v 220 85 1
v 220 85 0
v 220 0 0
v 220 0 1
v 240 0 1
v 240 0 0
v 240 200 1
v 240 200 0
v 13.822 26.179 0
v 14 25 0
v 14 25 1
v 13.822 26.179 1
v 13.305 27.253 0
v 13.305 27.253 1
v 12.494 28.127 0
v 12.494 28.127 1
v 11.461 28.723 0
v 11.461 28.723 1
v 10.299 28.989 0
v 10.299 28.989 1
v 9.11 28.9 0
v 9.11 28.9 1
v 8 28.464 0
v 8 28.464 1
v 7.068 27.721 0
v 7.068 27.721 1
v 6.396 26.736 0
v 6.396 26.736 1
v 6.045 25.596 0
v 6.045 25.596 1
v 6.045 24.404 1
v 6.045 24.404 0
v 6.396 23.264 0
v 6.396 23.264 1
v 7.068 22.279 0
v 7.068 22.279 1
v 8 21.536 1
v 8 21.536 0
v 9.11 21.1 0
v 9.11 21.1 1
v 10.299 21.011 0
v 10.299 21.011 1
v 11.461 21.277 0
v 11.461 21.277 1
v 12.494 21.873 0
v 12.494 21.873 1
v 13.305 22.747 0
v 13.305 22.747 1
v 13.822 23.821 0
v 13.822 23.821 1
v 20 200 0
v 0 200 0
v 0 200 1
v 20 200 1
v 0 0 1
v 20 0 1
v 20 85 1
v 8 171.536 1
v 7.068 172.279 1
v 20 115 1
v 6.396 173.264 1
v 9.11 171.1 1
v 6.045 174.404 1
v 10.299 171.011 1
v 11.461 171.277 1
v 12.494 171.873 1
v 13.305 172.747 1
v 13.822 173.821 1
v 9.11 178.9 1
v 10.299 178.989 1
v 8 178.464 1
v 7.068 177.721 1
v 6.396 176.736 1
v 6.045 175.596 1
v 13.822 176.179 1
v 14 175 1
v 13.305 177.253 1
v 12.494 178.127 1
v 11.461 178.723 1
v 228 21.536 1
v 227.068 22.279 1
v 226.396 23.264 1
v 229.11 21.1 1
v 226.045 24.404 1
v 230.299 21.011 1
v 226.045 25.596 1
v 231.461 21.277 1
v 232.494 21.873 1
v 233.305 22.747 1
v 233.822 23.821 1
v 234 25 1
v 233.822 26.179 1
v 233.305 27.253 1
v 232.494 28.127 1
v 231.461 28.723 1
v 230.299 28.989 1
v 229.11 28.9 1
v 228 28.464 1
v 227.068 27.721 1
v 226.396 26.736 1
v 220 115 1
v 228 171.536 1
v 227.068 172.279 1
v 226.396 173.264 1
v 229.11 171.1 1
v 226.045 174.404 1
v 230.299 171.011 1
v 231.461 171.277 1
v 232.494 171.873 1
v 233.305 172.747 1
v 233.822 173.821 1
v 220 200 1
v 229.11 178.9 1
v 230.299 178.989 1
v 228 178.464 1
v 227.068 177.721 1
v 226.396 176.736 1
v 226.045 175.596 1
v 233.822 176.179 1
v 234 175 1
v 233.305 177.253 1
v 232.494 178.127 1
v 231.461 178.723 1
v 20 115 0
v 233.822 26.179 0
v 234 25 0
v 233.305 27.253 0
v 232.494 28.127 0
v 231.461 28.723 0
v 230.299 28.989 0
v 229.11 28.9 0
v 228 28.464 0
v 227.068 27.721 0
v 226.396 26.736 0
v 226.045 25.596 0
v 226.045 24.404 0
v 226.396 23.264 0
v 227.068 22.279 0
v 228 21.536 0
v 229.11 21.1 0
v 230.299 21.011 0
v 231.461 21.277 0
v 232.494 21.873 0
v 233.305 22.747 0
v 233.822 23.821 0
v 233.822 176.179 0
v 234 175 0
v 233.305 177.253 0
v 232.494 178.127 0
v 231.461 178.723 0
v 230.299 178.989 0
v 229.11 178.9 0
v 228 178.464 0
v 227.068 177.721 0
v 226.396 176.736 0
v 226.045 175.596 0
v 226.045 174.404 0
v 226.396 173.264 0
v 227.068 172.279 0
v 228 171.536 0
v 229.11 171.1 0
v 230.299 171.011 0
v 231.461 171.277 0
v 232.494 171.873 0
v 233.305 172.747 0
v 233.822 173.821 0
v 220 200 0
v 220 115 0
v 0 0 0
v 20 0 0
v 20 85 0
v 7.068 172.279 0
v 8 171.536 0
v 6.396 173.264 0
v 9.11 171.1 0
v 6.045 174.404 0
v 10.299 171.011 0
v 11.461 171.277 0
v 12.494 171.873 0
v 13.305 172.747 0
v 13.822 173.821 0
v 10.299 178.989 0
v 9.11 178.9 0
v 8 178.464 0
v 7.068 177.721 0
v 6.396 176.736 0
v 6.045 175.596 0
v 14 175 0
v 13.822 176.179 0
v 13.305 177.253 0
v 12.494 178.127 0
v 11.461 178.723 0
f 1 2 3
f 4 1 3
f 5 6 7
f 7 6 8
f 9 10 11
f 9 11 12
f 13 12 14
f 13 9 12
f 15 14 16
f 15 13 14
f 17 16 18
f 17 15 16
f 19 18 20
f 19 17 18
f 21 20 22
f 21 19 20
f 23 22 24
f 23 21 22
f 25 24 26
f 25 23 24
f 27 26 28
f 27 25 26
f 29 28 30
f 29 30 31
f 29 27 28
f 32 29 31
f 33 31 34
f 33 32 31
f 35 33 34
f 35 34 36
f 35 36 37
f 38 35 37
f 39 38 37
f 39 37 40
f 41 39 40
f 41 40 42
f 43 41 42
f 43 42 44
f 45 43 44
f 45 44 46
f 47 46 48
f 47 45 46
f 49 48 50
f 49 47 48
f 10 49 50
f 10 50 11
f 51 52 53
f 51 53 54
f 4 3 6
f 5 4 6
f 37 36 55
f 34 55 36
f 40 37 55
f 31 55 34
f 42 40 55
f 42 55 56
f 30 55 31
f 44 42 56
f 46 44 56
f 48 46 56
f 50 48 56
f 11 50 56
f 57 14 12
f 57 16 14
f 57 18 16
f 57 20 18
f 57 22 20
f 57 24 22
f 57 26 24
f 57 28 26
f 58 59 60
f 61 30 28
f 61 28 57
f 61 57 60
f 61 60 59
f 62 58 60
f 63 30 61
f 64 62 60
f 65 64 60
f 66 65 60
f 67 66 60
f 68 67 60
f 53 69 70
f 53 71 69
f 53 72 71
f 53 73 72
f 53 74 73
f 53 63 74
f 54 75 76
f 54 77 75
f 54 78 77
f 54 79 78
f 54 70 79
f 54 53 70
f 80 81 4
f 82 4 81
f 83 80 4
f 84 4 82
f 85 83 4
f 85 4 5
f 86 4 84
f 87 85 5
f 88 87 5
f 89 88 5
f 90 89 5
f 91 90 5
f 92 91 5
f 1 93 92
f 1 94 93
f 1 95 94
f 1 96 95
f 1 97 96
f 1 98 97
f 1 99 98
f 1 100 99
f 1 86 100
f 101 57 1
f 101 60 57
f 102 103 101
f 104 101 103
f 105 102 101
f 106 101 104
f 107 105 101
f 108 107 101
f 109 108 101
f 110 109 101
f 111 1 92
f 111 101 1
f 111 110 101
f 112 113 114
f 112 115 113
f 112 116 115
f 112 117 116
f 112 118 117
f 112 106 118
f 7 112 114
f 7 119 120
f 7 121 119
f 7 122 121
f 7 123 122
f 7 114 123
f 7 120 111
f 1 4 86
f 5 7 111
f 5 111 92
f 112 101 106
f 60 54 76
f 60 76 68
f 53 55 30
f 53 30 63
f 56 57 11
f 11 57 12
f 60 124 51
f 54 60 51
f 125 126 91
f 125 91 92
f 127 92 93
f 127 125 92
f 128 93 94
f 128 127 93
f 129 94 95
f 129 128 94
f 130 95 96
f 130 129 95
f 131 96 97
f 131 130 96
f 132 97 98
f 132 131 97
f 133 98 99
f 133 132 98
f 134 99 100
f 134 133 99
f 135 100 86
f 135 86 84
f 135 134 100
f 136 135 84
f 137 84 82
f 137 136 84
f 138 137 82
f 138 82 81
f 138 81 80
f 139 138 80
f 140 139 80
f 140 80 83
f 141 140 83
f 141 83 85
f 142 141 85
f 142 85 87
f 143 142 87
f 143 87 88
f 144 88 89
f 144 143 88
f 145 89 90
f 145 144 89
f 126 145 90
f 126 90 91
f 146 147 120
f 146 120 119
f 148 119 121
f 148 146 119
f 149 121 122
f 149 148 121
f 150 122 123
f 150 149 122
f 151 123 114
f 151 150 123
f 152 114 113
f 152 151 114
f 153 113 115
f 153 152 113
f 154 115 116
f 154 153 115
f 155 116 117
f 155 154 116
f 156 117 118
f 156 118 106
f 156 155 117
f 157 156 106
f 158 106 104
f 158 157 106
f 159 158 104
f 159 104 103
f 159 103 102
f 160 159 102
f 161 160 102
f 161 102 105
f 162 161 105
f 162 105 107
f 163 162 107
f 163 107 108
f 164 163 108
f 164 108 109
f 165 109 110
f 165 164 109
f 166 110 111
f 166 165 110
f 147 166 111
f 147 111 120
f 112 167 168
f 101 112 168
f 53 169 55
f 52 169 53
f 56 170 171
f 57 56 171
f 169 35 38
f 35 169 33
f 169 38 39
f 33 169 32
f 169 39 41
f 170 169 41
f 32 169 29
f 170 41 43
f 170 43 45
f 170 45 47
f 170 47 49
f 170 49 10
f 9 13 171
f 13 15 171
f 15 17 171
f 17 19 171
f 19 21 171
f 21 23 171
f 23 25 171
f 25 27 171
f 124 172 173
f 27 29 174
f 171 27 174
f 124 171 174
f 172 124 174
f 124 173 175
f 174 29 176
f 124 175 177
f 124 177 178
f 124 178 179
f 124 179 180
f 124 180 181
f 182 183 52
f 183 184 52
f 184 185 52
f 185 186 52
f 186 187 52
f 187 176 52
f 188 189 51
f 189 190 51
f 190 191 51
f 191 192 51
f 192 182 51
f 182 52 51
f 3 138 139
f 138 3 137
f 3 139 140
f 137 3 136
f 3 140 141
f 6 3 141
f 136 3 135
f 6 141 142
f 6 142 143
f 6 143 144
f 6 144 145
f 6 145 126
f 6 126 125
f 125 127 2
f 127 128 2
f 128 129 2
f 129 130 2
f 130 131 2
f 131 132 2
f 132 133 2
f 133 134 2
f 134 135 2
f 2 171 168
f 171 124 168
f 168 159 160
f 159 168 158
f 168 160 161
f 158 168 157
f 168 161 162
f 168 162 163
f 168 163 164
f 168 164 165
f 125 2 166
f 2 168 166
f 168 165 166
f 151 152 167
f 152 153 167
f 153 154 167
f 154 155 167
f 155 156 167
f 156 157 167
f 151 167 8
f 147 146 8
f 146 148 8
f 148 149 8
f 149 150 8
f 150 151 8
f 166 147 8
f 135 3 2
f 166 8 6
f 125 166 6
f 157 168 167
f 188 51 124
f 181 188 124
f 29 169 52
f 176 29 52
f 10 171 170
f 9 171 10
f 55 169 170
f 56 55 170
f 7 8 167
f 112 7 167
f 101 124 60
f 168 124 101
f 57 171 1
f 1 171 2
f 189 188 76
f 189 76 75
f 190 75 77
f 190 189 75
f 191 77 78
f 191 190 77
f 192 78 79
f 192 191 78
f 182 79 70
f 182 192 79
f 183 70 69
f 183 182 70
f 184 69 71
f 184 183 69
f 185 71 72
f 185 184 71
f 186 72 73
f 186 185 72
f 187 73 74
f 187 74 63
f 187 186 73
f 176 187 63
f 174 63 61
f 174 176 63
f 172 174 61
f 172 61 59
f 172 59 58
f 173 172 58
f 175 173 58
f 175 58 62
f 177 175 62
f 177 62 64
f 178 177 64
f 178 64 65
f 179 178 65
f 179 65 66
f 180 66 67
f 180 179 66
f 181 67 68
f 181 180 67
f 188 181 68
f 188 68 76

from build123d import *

# Parameters (mm, degrees)
SKETCH1_W           = 200
SKETCH1_H           = 30
SKETCH1_W_2         = 20
SKETCH1_H_2         = 200
SKETCH1_R           = 4
BOSS_EXTRUDE1_DEPTH = 1


with BuildPart() as part:
    # Sketch1 → Boss-Extrude1 (new body)
    with BuildSketch(Plane.XY):
        with Locations((120, 100)):
            Rectangle(SKETCH1_W, SKETCH1_H)
        with Locations((10, 100)):
            Rectangle(SKETCH1_W_2, SKETCH1_H_2)
        with Locations((10, 175)):
            Circle(SKETCH1_R, mode=Mode.SUBTRACT)
        with Locations((10, 25)):
            Circle(SKETCH1_R, mode=Mode.SUBTRACT)
        Polygon((220, 200), (220, 115), (220, 85), (220, 0), (240, 0), (240, 200), align=None)
        with Locations((230, 25)):
            Circle(SKETCH1_R, mode=Mode.SUBTRACT)
        with Locations((230, 175)):
            Circle(SKETCH1_R, mode=Mode.SUBTRACT)
    extrude(amount=BOSS_EXTRUDE1_DEPTH)


solid = part.part
